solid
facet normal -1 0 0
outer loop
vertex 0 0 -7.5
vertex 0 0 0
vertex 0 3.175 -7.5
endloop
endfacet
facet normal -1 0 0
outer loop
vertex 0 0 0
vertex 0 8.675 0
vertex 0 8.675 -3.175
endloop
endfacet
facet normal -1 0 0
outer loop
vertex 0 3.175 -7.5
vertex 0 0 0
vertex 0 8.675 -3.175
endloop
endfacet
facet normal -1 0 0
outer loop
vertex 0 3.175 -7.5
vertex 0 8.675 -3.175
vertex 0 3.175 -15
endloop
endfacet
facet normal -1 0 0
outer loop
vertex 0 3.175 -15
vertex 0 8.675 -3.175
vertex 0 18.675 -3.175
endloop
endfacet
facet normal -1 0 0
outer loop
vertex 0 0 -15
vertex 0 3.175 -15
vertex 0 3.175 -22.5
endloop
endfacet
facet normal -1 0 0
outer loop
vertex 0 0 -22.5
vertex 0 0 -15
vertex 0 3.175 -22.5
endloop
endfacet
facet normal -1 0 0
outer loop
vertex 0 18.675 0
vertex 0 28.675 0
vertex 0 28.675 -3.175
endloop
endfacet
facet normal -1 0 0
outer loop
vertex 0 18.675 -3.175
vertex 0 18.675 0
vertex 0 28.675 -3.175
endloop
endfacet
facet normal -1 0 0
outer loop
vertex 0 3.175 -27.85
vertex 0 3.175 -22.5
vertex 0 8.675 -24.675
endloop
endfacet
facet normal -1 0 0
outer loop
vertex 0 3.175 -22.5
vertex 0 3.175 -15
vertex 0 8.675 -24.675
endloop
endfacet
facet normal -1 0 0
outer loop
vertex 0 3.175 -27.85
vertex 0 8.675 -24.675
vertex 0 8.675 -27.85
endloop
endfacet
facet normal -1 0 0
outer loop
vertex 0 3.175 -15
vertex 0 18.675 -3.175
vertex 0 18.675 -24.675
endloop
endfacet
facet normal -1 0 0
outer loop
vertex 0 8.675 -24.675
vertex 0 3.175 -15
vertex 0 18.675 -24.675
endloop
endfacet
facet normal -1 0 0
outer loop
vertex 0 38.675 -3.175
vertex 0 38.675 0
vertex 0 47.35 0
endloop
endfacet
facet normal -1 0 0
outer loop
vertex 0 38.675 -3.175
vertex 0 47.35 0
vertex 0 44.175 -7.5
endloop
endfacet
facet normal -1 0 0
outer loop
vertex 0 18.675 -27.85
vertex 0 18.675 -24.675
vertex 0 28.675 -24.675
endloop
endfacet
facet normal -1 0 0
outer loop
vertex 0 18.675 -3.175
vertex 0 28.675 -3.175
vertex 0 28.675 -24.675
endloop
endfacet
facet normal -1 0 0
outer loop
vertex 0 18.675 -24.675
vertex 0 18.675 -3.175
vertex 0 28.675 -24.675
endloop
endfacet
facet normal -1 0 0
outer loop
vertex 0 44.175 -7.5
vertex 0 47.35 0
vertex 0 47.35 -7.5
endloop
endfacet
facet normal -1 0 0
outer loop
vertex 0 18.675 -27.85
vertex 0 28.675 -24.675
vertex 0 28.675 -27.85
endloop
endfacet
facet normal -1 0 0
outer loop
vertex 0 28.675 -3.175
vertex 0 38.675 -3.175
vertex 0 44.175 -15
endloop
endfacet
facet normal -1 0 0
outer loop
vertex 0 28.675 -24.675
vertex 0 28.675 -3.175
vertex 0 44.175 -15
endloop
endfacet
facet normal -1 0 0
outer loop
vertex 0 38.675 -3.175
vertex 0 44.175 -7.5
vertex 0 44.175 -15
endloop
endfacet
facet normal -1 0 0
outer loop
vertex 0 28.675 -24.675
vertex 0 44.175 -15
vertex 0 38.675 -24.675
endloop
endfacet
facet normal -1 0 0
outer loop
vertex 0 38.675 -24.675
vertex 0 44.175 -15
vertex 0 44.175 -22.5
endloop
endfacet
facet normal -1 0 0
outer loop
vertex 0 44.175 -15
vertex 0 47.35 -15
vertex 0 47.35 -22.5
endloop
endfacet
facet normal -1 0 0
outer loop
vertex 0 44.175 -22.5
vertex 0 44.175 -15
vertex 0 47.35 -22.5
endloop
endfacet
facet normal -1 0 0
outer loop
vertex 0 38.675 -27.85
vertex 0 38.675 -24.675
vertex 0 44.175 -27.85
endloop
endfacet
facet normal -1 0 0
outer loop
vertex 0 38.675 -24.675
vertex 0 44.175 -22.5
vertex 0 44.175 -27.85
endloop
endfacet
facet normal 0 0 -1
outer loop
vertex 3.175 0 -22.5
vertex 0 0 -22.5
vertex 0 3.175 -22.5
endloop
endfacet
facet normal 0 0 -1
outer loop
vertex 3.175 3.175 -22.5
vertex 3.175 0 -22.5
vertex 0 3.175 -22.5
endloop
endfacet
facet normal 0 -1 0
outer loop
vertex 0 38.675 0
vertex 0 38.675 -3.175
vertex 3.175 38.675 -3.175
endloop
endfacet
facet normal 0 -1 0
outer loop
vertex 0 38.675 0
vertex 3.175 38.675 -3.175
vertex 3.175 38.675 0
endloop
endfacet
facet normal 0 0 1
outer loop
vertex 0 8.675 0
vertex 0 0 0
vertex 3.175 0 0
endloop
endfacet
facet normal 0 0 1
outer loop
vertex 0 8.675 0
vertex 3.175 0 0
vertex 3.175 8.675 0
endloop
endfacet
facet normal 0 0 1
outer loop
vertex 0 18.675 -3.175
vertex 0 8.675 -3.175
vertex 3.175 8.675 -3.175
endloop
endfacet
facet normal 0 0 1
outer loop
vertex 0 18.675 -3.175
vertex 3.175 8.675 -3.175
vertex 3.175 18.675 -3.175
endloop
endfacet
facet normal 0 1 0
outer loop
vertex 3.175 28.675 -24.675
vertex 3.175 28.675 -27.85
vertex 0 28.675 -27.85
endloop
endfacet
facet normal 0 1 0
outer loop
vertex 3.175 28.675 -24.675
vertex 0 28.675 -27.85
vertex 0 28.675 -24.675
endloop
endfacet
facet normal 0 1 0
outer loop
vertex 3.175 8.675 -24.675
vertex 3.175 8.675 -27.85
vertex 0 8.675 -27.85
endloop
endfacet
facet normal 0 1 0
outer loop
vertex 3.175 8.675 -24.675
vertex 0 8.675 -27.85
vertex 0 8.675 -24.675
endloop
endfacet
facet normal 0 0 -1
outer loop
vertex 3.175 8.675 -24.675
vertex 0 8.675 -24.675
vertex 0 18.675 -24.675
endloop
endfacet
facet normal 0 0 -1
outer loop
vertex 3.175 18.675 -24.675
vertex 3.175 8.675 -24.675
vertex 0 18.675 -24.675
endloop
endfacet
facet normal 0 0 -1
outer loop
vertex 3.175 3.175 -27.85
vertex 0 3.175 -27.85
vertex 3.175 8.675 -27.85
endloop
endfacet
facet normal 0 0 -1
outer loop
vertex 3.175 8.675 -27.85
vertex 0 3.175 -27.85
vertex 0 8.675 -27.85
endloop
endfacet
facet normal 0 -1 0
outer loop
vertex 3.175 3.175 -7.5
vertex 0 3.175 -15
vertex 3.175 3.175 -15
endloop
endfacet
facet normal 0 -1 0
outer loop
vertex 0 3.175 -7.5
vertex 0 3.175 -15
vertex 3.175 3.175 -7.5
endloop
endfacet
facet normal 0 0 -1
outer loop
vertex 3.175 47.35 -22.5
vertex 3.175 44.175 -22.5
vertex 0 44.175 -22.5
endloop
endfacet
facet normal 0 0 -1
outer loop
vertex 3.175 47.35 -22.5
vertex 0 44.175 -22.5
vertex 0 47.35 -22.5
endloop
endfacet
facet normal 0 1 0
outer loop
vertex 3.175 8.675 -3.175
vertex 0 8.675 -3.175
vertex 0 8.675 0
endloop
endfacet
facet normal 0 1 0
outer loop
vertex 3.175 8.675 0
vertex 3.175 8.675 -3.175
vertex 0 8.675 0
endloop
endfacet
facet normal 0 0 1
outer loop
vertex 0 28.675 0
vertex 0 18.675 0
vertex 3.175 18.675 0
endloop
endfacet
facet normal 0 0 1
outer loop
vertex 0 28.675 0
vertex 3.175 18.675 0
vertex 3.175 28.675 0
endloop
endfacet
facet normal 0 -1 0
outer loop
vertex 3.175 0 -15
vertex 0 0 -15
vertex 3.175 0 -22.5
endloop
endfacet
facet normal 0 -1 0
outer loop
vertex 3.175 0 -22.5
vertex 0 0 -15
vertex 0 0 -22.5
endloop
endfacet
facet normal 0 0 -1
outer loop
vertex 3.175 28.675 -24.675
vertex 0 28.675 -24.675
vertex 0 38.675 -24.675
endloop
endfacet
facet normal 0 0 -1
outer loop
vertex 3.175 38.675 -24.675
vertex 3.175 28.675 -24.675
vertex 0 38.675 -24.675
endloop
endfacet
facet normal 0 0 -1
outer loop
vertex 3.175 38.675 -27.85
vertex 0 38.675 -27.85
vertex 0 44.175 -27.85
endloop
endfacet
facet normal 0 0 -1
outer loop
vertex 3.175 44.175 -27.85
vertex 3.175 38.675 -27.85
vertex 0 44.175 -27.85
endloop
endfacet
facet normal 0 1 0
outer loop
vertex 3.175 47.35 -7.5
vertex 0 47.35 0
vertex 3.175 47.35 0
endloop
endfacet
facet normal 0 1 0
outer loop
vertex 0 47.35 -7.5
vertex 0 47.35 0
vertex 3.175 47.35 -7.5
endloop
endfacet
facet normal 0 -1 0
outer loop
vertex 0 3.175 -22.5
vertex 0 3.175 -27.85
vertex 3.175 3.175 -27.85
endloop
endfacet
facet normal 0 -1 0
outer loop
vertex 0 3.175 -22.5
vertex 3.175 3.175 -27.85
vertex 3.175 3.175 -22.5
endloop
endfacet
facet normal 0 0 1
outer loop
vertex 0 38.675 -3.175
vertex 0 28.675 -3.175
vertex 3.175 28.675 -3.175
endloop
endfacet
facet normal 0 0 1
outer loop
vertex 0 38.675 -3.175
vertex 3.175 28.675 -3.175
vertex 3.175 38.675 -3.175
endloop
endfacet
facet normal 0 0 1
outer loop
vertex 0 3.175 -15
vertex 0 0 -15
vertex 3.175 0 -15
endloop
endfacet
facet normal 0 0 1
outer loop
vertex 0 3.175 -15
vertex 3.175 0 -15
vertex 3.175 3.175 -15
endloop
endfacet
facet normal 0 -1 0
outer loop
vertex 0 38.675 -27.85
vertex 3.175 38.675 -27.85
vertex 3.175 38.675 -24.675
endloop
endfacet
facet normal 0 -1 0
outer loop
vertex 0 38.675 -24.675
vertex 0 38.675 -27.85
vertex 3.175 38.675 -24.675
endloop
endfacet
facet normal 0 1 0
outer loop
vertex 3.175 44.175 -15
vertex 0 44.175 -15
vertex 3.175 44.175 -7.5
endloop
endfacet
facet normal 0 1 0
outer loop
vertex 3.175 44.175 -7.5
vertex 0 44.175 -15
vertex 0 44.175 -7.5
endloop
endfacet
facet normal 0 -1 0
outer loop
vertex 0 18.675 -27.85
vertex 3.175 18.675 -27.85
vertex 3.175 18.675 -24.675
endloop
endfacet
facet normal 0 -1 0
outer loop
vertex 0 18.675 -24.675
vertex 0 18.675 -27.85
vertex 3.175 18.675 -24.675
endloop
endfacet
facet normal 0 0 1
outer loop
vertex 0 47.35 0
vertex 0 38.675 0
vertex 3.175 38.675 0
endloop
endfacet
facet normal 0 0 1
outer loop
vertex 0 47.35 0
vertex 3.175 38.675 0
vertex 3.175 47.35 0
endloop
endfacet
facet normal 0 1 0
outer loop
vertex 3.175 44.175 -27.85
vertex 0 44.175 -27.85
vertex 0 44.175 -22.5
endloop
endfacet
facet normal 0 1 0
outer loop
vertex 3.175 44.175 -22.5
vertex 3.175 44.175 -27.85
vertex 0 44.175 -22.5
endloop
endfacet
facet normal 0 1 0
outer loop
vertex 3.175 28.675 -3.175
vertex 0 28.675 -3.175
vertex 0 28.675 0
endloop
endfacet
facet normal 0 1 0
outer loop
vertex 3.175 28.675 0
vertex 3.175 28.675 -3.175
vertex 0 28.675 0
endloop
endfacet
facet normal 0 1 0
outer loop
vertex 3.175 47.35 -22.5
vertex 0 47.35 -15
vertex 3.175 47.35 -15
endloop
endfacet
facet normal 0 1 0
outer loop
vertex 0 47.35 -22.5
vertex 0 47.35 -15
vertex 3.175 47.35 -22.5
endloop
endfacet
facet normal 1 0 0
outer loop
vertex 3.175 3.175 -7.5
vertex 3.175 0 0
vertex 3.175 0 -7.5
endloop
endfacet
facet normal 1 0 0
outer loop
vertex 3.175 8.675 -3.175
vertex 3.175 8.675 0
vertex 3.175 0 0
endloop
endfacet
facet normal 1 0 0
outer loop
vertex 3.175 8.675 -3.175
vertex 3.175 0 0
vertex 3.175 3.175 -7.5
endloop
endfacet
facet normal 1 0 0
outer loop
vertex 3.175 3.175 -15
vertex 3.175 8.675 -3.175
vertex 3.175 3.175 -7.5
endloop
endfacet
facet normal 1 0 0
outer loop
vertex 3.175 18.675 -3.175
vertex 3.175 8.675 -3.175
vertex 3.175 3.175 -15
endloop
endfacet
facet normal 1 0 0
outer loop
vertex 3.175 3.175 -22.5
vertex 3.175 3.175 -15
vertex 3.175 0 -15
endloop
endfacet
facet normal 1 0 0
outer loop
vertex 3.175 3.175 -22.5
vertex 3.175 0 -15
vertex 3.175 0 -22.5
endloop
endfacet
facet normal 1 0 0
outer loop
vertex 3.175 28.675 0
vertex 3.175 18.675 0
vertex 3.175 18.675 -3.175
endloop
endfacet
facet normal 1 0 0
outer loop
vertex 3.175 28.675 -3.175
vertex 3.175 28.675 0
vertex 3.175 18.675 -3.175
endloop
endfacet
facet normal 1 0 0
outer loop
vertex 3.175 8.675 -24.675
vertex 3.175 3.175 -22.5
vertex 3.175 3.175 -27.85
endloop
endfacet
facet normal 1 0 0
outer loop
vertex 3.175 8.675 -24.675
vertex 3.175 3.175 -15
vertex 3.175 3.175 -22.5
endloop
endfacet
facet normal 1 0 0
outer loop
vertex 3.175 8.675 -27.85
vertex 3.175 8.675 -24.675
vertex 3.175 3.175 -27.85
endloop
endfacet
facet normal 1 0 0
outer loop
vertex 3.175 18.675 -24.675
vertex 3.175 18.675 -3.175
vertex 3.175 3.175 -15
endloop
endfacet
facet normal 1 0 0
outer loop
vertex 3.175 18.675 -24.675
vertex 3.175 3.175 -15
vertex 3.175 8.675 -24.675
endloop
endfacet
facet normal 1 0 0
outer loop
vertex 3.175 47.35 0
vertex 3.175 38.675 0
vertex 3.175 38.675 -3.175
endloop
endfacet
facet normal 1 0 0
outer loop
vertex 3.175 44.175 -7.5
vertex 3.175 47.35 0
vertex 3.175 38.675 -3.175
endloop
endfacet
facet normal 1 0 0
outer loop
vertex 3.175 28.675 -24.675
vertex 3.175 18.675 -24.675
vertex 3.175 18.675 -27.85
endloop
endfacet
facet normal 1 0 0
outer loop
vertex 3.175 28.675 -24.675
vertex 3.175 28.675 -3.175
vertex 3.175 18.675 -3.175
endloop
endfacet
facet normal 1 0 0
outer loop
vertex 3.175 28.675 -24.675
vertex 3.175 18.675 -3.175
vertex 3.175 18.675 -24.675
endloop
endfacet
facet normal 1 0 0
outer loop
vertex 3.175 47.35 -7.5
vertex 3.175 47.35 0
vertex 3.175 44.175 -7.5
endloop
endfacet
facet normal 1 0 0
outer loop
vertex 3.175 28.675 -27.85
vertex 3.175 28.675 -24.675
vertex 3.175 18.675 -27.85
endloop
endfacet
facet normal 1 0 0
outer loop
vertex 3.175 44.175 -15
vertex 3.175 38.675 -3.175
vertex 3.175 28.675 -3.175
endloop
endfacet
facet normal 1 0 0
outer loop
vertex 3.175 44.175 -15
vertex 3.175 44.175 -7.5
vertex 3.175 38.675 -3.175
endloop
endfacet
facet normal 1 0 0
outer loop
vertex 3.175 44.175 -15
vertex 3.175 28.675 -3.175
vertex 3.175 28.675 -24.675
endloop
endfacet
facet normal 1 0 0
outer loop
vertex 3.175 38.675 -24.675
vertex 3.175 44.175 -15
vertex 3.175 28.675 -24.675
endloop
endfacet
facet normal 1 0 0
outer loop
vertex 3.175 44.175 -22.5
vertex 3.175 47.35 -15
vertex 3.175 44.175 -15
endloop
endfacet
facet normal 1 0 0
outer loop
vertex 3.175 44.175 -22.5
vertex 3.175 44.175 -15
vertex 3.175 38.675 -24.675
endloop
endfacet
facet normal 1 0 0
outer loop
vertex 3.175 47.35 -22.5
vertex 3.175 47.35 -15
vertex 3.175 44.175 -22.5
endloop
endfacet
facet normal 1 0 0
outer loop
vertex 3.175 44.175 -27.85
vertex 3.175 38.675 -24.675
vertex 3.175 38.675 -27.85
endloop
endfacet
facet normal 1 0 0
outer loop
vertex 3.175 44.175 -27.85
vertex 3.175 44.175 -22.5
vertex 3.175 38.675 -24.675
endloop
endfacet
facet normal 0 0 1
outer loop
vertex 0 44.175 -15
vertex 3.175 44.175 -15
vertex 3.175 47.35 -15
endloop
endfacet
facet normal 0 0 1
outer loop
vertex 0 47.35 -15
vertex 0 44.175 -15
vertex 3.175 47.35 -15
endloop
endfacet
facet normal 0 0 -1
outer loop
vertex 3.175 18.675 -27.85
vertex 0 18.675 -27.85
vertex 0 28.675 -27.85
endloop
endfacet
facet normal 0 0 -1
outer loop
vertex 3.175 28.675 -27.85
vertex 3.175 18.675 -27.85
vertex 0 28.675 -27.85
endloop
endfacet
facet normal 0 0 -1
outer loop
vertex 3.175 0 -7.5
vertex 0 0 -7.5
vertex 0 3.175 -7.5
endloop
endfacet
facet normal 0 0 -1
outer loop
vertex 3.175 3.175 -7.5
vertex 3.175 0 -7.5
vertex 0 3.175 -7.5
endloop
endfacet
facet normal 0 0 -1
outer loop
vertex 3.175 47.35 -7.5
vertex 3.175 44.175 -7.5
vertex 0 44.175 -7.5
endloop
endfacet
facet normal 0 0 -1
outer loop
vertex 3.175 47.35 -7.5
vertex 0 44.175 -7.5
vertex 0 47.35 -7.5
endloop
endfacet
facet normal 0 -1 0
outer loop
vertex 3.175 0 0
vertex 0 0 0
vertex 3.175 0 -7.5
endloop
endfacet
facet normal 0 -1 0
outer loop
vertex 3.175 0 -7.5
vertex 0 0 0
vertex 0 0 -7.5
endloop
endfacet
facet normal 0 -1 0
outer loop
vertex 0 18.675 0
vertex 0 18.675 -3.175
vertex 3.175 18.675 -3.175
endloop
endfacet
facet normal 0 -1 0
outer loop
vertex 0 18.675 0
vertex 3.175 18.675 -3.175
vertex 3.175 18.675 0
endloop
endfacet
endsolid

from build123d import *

# Parameters (mm, degrees)
SKETCH1_W           = 35.35
SKETCH1_H           = 47.35
BOSS_EXTRUDE1_DEPTH = 3.175
SKETCH2_W           = 7.5
SKETCH2_H           = 47.35
CUT_EXTRUDE1_DEPTH  = 4.175
SKETCH3_W           = 3.175
SKETCH3_H           = 10
SKETCH3_W_2         = 7.5
SKETCH3_H_2         = 3.175
SKETCH3_W_3         = 5.35
CUT_EXTRUDE2_DEPTH  = 4.175


with BuildPart() as part:
    # Sketch1 → Boss-Extrude1 (new body)
    with BuildSketch(Plane(origin=(0, 0, 0), x_dir=(0, 0, -1), z_dir=(1, 0, 0))):
        with Locations((17.675, 23.675)):
            Rectangle(SKETCH1_W, SKETCH1_H)
    extrude(amount=BOSS_EXTRUDE1_DEPTH)

    # Sketch2 → Cut-Extrude1 (cut, through all)
    with BuildSketch(Plane.ZY):
        with Locations((-31.6, 23.675)):
            Rectangle(SKETCH2_W, SKETCH2_H)
    extrude(amount=-CUT_EXTRUDE1_DEPTH, mode=Mode.SUBTRACT)

    # Sketch3 → Cut-Extrude2 (cut, through all)
    with BuildSketch(Plane.ZY):
        with Locations((-1.5875, 13.675)):
            Rectangle(SKETCH3_W, SKETCH3_H)
        with Locations((-1.5875, 33.675)):
            Rectangle(SKETCH3_W, SKETCH3_H)
        with Locations((-26.2625, 13.675)):
            Rectangle(SKETCH3_W, SKETCH3_H)
        with Locations((-26.2625, 33.675)):
            Rectangle(SKETCH3_W, SKETCH3_H)
        with Locations((-11.25, 45.7625)):
            Rectangle(SKETCH3_W_2, SKETCH3_H_2)
        with Locations((-11.25, 1.5875)):
            Rectangle(SKETCH3_W_2, SKETCH3_H_2)
        with Locations((-25.175, 45.7625)):
            Rectangle(SKETCH3_W_3, SKETCH3_H_2)
        with Locations((-25.175, 1.5875)):
            Rectangle(SKETCH3_W_3, SKETCH3_H_2)
    extrude(amount=-CUT_EXTRUDE2_DEPTH, mode=Mode.SUBTRACT)


solid = part.part
